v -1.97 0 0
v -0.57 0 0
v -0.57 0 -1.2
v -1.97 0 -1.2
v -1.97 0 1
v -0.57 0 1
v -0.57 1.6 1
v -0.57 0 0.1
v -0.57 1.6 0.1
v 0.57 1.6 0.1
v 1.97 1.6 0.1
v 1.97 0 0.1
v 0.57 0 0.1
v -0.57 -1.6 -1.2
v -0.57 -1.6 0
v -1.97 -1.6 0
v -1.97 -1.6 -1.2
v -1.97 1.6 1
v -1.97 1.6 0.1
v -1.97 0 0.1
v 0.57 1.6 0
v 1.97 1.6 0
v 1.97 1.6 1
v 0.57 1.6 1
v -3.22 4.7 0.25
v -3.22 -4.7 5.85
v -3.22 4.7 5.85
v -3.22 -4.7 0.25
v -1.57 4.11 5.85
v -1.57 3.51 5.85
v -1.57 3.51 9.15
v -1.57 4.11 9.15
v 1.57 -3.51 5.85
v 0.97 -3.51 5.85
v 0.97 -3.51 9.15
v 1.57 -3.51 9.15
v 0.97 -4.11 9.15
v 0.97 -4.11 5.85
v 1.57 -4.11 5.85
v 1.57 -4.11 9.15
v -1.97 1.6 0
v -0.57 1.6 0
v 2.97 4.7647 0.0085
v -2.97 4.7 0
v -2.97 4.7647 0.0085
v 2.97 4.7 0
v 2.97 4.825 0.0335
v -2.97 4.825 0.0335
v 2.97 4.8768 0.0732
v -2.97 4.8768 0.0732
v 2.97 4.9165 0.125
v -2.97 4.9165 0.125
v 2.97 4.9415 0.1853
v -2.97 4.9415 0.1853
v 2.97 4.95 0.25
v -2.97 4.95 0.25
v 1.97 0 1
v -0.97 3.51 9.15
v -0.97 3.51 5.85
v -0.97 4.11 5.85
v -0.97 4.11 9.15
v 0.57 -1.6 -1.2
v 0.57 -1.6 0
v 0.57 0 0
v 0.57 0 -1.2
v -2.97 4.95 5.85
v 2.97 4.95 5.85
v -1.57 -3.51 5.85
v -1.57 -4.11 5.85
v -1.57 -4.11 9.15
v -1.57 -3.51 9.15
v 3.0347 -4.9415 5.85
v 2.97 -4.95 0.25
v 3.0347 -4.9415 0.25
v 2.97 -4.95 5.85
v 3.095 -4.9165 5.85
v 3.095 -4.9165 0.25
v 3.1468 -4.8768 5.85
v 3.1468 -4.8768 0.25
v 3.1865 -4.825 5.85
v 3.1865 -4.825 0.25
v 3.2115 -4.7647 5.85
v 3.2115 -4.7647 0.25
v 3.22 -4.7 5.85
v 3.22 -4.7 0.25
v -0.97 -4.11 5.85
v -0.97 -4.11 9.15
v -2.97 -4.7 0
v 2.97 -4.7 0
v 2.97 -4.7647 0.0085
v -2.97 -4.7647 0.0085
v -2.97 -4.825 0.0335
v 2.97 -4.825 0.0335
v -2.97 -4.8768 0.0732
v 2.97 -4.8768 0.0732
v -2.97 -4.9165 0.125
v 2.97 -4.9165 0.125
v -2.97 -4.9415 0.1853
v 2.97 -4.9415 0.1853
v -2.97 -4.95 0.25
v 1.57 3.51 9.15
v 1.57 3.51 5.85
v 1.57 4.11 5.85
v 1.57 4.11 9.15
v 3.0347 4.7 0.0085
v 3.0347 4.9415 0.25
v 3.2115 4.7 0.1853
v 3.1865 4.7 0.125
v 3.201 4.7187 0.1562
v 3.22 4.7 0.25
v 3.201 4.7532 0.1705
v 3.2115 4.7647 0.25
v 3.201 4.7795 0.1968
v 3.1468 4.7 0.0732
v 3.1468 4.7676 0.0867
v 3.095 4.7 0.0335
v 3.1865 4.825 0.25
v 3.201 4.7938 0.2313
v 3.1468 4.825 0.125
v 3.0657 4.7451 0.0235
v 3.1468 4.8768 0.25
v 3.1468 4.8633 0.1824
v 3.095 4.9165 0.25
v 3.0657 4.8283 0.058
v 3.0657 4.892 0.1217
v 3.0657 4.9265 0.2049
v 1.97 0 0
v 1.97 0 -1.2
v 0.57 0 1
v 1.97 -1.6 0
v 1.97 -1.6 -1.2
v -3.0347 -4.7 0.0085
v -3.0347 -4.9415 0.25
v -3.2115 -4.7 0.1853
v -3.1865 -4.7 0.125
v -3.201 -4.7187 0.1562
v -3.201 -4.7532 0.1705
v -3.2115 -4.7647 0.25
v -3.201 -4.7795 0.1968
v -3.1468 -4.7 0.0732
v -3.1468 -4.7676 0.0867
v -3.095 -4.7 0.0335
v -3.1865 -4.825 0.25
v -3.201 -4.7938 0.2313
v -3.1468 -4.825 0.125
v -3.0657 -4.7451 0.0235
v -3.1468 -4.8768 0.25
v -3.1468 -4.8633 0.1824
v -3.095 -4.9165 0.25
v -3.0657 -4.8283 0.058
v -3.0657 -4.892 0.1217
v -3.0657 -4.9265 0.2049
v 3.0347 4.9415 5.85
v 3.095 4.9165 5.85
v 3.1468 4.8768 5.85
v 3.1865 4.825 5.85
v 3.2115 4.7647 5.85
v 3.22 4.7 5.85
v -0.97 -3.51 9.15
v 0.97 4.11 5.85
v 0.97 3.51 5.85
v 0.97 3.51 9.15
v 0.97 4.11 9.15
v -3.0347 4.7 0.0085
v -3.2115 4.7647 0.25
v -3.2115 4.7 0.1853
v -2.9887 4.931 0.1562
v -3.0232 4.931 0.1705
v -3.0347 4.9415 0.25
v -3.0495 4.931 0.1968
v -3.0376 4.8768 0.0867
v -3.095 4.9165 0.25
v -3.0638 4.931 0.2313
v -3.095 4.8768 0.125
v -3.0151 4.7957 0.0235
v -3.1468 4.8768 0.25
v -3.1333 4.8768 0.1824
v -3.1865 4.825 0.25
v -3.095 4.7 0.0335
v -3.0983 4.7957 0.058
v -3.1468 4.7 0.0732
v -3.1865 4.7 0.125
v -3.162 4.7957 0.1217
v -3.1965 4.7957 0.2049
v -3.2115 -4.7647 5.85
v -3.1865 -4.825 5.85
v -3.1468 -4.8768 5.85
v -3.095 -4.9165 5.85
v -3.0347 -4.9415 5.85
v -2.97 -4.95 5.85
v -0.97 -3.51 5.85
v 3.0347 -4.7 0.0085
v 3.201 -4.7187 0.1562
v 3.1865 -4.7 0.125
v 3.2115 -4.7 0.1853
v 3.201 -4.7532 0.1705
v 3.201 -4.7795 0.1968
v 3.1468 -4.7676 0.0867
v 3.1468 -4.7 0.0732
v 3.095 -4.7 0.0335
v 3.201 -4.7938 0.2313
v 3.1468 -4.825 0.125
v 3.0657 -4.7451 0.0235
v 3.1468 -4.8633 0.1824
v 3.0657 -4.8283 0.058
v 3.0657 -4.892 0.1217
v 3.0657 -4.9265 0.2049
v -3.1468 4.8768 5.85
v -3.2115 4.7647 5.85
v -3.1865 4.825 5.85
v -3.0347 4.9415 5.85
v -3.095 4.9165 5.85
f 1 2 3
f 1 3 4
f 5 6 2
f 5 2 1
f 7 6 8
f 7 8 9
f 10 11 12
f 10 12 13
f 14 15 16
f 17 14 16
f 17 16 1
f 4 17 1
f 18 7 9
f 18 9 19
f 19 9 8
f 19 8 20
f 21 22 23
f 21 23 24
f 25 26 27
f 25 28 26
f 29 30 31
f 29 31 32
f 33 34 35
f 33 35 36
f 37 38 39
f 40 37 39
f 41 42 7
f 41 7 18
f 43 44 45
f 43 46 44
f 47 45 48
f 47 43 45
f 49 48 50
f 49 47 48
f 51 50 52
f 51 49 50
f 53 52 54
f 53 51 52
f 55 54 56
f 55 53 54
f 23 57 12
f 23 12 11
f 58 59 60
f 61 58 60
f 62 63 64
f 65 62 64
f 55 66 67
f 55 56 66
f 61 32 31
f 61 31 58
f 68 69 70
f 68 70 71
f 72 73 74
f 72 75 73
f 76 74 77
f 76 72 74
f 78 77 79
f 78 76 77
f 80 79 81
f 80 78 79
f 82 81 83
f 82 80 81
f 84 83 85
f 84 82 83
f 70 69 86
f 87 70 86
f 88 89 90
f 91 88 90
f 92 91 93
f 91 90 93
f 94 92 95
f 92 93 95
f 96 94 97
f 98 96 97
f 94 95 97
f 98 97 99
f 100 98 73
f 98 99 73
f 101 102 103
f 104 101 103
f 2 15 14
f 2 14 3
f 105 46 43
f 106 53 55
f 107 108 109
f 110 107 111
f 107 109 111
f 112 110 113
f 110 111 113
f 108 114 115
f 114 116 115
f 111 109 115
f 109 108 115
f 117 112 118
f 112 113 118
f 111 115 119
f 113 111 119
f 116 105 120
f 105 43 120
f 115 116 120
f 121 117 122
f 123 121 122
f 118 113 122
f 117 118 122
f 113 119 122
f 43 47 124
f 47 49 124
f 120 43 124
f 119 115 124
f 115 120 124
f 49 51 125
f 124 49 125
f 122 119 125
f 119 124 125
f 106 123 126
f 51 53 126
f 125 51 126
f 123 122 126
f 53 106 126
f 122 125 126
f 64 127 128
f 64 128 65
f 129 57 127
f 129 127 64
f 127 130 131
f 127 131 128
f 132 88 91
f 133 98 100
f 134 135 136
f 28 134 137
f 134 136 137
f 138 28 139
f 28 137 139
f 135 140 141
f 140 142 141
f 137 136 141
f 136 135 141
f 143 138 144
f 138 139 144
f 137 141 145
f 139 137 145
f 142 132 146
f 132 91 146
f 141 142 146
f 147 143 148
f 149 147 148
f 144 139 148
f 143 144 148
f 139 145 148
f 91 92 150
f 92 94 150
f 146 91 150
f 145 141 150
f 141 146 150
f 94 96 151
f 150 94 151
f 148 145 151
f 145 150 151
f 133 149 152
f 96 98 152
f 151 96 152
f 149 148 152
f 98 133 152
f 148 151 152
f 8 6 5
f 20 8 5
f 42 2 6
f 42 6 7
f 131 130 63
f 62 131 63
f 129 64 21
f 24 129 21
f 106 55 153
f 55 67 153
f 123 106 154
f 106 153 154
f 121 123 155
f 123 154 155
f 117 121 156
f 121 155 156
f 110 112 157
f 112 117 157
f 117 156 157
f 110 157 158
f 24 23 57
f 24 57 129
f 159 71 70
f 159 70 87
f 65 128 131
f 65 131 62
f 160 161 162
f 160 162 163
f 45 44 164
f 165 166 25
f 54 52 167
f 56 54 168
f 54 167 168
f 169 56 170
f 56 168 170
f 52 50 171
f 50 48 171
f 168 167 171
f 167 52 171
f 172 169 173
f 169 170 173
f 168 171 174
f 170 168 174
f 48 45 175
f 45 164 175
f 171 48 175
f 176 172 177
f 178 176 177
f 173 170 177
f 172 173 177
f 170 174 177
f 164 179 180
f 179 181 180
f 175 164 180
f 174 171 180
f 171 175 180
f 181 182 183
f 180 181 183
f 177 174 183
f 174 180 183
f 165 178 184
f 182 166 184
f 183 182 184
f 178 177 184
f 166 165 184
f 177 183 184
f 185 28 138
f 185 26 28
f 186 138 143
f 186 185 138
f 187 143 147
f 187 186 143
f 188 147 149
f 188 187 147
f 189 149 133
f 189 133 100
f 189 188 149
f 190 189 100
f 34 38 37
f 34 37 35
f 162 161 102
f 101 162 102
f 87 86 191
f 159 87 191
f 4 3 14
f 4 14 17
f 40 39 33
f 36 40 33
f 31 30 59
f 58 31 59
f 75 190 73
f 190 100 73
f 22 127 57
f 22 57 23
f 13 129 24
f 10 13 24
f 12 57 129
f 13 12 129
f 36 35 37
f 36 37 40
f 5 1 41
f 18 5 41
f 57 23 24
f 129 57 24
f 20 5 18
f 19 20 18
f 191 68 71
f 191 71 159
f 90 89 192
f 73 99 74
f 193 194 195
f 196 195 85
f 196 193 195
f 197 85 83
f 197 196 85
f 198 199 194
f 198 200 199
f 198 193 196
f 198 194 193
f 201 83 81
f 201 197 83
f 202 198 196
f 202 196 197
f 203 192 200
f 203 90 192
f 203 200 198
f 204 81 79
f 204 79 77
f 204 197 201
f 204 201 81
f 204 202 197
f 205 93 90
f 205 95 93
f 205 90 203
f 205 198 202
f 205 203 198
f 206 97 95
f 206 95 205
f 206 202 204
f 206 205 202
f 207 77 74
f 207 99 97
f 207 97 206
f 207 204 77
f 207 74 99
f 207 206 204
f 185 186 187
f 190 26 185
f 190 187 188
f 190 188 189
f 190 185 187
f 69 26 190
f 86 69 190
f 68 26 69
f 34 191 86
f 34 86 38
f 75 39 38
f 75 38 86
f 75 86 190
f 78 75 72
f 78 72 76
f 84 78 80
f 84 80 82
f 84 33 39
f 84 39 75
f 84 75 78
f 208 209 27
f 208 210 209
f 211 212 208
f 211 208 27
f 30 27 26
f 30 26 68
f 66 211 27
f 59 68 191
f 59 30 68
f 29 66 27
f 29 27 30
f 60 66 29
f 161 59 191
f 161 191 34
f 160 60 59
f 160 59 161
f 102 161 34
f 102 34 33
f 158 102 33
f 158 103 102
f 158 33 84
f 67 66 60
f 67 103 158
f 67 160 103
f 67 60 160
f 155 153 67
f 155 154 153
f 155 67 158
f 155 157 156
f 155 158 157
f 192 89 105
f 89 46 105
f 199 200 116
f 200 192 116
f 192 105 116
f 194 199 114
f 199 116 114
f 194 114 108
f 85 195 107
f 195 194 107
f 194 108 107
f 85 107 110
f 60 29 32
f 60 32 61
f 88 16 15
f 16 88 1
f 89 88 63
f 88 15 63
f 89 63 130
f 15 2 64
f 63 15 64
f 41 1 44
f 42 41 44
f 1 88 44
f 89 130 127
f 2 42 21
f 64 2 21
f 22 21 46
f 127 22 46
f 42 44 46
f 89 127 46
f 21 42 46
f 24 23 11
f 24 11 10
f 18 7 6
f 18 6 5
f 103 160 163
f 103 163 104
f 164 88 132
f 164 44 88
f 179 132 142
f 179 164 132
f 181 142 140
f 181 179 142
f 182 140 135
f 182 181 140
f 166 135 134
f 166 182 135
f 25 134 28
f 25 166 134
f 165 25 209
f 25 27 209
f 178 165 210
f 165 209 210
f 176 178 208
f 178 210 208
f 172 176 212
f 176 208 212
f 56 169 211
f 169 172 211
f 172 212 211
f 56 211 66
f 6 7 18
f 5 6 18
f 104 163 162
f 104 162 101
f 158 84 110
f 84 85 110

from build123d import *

# Parameters (mm, degrees)
IZIM1_W                       = 6.44
IZIM1_H                       = 9.9
Y_KSEKLIK_EKSTR_ZYON1_DEPTH   = 5.85
IZIM2_W                       = 1.4
IZIM2_H                       = 3.2
KES_EKSTR_ZYON1_DEPTH         = 1
IZIM4_W                       = 1.4
IZIM4_H                       = 1.6
Y_KSEKLIK_EKSTR_ZYON3_DEPTH   = 2.2
IZIM5_W                       = 1.4
IZIM5_H                       = 1.6
Y_KSEKLIK_EKSTR_ZYON4_DEPTH   = 0.9
Y_KSEKLIK_EKSTR_ZYON4_2_DEPTH = 0.9
RADYUS1_R                     = 0.25
IZIM6_W                       = 0.6
IZIM6_H                       = 0.6
Y_KSEKLIK_EKSTR_ZYON5_DEPTH   = 3.3


with BuildPart() as part:
    # Çizim1 → Yükseklik-Ekstrüzyon1 (new body)
    with BuildSketch(Plane.XY):
        Rectangle(IZIM1_W, IZIM1_H)
    extrude(amount=Y_KSEKLIK_EKSTR_ZYON1_DEPTH)

    # Çizim2 → Kes-Ekstrüzyon1 (cut)
    with BuildSketch(Plane(origin=(0, 0, 0), x_dir=(-1, 0, 0), z_dir=(0, 0, -1))):
        with Locations((-1.27, 0)):
            Rectangle(IZIM2_W, IZIM2_H)
        with Locations((1.27, 0)):
            Rectangle(IZIM2_W, IZIM2_H)
    extrude(amount=-KES_EKSTR_ZYON1_DEPTH, mode=Mode.SUBTRACT)

    # Çizim4 → Yükseklik-Ekstrüzyon3 (add)
    with BuildSketch(Plane(origin=(0, 0, 1), x_dir=(-1, 0, 0), z_dir=(0, 0, -1))):
        with Locations((-1.27, -0.8)):
            Rectangle(IZIM4_W, IZIM4_H)
        with Locations((1.27, -0.8)):
            Rectangle(IZIM4_W, IZIM4_H)
    extrude(amount=Y_KSEKLIK_EKSTR_ZYON3_DEPTH)

    # Radyus1
    radyus1_edges = [part.edges().sort_by_distance(p)[0] for p in [
        (0, -4.95, 0),
        (-3.22, 0, 0),
        (0, 4.95, 0),
        (3.22, 0, 0),
        (3.22, -4.95, 2.925),
        (-3.22, -4.95, 2.925),
        (-3.22, 4.95, 2.925),
        (3.22, 4.95, 2.925),
    ]]
    fillet(radyus1_edges, radius=RADYUS1_R)

    # Çizim6 → Yükseklik-Ekstrüzyon5 (add)
    with BuildSketch(Plane.XY.offset(5.85)):
        with Locations((1.27, -3.81)):
            Rectangle(IZIM6_W, IZIM6_H)
        with Locations((-1.27, -3.81)):
            Rectangle(IZIM6_W, IZIM6_H)
        with Locations((-1.27, 3.81)):
            Rectangle(IZIM6_W, IZIM6_H)
        with Locations((1.27, 3.81)):
            Rectangle(IZIM6_W, IZIM6_H)
    extrude(amount=Y_KSEKLIK_EKSTR_ZYON5_DEPTH)


with BuildPart() as body_2:
    # Çizim5 → Yükseklik-Ekstrüzyon4 (new body)
    with BuildSketch(Plane(origin=(0, 0, 1), x_dir=(-1, 0, 0), z_dir=(0, 0, -1))):
        with Locations((-1.27, 0.8)):
            Rectangle(IZIM5_W, IZIM5_H)
    extrude(amount=Y_KSEKLIK_EKSTR_ZYON4_DEPTH)


with BuildPart() as body_3:
    # Çizim5 → Y_kseklik-Ekstr_zyon4 2 (new body)
    with BuildSketch(Plane(origin=(0, 0, 1), x_dir=(-1, 0, 0), z_dir=(0, 0, -1))):
        with Locations((1.27, 0.8)):
            Rectangle(IZIM5_W, IZIM5_H)
    extrude(amount=Y_KSEKLIK_EKSTR_ZYON4_2_DEPTH)


solid = Compound([part.part, body_2.part, body_3.part])
